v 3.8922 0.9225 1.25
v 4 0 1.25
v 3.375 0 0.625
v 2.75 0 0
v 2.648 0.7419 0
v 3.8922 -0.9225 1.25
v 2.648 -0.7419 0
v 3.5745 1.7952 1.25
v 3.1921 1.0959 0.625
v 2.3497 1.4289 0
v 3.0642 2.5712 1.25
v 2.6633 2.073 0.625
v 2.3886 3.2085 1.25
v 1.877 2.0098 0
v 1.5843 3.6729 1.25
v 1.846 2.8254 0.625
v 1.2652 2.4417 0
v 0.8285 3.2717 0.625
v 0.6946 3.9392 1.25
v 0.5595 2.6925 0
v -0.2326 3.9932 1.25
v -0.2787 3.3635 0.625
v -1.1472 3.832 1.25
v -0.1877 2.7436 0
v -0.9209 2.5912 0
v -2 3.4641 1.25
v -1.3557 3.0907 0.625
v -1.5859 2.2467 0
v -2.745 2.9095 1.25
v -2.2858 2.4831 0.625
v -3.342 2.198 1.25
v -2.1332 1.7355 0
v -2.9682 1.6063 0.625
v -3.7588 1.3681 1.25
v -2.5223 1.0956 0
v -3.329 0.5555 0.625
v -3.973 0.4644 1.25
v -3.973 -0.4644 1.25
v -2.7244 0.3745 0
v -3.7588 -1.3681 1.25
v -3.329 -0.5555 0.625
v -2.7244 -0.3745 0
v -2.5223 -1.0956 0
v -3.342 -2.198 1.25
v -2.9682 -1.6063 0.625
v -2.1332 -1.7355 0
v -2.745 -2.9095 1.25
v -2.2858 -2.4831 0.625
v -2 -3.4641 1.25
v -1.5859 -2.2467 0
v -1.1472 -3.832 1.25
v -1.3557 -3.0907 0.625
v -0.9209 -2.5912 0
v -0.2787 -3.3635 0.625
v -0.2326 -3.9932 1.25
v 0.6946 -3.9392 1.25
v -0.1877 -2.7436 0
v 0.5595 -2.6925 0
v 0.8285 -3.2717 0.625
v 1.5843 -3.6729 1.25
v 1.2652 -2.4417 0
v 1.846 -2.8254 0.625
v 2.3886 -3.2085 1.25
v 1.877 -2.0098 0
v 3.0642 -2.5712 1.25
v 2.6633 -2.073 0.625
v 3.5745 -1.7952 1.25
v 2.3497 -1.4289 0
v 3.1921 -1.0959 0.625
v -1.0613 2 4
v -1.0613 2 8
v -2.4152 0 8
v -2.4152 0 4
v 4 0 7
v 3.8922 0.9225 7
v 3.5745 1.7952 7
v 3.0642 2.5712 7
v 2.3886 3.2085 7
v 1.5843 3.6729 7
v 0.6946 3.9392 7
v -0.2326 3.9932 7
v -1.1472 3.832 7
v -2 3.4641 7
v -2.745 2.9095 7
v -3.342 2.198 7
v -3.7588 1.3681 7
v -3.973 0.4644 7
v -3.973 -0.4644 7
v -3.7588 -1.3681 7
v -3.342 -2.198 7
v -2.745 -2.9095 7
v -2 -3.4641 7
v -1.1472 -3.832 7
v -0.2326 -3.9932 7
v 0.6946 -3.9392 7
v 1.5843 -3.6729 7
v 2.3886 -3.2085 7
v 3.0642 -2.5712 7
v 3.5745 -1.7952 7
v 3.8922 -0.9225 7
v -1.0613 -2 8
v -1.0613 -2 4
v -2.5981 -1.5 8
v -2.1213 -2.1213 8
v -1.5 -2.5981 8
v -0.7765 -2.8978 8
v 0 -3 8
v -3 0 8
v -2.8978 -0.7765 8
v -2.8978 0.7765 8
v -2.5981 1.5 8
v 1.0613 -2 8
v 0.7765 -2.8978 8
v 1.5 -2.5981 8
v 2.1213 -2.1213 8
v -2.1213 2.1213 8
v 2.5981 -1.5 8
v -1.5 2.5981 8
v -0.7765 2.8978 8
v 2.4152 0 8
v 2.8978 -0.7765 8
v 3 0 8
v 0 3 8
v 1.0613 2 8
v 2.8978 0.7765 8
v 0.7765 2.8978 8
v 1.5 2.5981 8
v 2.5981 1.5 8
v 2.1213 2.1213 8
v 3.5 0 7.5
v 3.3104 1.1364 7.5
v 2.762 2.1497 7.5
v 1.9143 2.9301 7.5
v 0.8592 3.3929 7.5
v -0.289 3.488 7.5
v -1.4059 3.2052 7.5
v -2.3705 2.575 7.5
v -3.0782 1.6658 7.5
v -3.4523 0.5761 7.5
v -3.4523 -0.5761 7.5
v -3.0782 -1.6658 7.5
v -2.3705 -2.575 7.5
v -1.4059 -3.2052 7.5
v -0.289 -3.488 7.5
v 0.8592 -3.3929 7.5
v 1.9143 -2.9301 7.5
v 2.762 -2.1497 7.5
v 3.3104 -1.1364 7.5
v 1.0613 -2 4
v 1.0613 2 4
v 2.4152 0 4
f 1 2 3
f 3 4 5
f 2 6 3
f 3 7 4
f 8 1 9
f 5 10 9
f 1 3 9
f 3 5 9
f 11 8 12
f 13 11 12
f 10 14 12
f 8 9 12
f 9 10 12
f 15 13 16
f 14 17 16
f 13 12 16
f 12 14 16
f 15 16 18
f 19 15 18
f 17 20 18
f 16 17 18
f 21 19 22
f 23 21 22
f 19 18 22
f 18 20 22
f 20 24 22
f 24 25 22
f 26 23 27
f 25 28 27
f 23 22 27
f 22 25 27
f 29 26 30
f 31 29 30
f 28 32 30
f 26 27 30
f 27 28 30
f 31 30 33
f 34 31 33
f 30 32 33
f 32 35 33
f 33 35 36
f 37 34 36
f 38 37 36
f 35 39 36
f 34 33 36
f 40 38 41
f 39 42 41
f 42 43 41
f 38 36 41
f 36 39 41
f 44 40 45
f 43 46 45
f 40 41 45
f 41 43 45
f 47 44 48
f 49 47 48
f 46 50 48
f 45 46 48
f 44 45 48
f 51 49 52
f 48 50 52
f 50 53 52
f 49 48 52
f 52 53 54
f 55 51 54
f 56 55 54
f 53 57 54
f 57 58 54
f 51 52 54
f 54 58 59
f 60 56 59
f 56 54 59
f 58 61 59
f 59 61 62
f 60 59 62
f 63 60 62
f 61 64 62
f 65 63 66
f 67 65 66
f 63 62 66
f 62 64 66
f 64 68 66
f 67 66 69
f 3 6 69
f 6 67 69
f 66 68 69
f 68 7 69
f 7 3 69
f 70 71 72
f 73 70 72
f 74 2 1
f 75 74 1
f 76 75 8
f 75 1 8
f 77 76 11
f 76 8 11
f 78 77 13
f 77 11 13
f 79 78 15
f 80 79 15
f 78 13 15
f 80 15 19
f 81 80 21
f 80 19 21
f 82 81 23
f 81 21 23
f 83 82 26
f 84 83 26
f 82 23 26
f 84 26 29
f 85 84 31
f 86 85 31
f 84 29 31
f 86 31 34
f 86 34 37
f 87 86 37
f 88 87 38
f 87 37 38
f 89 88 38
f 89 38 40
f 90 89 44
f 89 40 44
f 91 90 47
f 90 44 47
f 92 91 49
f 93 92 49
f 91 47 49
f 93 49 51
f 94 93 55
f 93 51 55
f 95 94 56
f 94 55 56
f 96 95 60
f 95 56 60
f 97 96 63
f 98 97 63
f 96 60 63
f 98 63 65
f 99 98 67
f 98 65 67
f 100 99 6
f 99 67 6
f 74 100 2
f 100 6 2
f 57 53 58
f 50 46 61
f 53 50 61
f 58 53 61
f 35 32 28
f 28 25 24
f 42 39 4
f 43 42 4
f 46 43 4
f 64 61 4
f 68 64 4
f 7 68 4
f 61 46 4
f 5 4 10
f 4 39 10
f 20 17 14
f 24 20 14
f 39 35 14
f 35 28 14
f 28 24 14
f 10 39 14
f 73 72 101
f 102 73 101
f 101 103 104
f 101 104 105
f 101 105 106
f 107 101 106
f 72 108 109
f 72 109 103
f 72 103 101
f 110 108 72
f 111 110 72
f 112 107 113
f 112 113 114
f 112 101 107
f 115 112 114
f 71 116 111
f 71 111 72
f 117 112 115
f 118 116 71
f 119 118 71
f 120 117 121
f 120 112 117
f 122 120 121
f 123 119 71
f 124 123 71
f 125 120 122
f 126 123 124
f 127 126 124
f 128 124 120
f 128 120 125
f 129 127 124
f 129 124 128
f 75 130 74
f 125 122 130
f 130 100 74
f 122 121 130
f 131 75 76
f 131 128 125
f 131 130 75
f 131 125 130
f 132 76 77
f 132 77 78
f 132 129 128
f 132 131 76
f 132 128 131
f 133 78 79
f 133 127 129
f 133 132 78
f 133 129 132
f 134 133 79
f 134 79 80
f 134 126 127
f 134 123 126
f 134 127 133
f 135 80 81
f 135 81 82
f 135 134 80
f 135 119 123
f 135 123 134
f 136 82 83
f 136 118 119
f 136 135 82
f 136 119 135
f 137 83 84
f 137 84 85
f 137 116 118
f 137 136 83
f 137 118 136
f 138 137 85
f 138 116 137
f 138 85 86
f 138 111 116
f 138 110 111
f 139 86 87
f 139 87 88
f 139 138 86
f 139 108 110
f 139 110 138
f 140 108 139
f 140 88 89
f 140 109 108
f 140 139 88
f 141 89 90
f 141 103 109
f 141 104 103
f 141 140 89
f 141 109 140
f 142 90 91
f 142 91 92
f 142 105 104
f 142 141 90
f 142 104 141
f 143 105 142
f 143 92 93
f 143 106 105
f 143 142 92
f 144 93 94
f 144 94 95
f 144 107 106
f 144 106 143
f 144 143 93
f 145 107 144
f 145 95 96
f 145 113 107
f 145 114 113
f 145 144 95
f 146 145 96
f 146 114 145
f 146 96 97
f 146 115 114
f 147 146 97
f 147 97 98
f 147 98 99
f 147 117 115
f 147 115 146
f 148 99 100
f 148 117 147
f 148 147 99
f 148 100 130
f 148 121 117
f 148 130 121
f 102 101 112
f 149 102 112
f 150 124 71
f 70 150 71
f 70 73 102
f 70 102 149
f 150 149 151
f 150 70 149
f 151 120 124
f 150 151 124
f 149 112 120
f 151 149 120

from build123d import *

# Parameters (mm, degrees)
ESQUISSE1_R             = 4
BASE_EXTRUSION_DEPTH    = 8
CHANFREIN1_SIZE         = 1.25
ENL_V_MAT_EXTRU_1_DEPTH = 4
CHANFREIN2_SIZE         = 1


with BuildPart() as part:
    # Esquisse1 → Base-Extrusion (new body)
    with BuildSketch(Plane.XY):
        Circle(ESQUISSE1_R)
    extrude(amount=BASE_EXTRUSION_DEPTH)

    # Chanfrein1
    chanfrein1_edges = [part.edges().sort_by_distance(p)[0] for p in [
        (-4, 0, 0),
    ]]
    chamfer(chanfrein1_edges, length=CHANFREIN1_SIZE)

    # Esquisse2 → Enlèv. mat.-Extru.1 (cut)
    with BuildSketch(Plane.XY.offset(8)):
        Polygon((2.415171399, 0), (1.061268564, 2), (-1.061268564, 2), (-2.415171399, 0), (-1.061268564, -2), (1.061268564, -2), align=None)
    extrude(amount=-ENL_V_MAT_EXTRU_1_DEPTH, mode=Mode.SUBTRACT)

    # Chanfrein2
    chanfrein2_edges = [part.edges().sort_by_distance(p)[0] for p in [
        (-4, 0, 8),
    ]]
    chamfer(chanfrein2_edges, length=CHANFREIN2_SIZE)


solid = part.part
